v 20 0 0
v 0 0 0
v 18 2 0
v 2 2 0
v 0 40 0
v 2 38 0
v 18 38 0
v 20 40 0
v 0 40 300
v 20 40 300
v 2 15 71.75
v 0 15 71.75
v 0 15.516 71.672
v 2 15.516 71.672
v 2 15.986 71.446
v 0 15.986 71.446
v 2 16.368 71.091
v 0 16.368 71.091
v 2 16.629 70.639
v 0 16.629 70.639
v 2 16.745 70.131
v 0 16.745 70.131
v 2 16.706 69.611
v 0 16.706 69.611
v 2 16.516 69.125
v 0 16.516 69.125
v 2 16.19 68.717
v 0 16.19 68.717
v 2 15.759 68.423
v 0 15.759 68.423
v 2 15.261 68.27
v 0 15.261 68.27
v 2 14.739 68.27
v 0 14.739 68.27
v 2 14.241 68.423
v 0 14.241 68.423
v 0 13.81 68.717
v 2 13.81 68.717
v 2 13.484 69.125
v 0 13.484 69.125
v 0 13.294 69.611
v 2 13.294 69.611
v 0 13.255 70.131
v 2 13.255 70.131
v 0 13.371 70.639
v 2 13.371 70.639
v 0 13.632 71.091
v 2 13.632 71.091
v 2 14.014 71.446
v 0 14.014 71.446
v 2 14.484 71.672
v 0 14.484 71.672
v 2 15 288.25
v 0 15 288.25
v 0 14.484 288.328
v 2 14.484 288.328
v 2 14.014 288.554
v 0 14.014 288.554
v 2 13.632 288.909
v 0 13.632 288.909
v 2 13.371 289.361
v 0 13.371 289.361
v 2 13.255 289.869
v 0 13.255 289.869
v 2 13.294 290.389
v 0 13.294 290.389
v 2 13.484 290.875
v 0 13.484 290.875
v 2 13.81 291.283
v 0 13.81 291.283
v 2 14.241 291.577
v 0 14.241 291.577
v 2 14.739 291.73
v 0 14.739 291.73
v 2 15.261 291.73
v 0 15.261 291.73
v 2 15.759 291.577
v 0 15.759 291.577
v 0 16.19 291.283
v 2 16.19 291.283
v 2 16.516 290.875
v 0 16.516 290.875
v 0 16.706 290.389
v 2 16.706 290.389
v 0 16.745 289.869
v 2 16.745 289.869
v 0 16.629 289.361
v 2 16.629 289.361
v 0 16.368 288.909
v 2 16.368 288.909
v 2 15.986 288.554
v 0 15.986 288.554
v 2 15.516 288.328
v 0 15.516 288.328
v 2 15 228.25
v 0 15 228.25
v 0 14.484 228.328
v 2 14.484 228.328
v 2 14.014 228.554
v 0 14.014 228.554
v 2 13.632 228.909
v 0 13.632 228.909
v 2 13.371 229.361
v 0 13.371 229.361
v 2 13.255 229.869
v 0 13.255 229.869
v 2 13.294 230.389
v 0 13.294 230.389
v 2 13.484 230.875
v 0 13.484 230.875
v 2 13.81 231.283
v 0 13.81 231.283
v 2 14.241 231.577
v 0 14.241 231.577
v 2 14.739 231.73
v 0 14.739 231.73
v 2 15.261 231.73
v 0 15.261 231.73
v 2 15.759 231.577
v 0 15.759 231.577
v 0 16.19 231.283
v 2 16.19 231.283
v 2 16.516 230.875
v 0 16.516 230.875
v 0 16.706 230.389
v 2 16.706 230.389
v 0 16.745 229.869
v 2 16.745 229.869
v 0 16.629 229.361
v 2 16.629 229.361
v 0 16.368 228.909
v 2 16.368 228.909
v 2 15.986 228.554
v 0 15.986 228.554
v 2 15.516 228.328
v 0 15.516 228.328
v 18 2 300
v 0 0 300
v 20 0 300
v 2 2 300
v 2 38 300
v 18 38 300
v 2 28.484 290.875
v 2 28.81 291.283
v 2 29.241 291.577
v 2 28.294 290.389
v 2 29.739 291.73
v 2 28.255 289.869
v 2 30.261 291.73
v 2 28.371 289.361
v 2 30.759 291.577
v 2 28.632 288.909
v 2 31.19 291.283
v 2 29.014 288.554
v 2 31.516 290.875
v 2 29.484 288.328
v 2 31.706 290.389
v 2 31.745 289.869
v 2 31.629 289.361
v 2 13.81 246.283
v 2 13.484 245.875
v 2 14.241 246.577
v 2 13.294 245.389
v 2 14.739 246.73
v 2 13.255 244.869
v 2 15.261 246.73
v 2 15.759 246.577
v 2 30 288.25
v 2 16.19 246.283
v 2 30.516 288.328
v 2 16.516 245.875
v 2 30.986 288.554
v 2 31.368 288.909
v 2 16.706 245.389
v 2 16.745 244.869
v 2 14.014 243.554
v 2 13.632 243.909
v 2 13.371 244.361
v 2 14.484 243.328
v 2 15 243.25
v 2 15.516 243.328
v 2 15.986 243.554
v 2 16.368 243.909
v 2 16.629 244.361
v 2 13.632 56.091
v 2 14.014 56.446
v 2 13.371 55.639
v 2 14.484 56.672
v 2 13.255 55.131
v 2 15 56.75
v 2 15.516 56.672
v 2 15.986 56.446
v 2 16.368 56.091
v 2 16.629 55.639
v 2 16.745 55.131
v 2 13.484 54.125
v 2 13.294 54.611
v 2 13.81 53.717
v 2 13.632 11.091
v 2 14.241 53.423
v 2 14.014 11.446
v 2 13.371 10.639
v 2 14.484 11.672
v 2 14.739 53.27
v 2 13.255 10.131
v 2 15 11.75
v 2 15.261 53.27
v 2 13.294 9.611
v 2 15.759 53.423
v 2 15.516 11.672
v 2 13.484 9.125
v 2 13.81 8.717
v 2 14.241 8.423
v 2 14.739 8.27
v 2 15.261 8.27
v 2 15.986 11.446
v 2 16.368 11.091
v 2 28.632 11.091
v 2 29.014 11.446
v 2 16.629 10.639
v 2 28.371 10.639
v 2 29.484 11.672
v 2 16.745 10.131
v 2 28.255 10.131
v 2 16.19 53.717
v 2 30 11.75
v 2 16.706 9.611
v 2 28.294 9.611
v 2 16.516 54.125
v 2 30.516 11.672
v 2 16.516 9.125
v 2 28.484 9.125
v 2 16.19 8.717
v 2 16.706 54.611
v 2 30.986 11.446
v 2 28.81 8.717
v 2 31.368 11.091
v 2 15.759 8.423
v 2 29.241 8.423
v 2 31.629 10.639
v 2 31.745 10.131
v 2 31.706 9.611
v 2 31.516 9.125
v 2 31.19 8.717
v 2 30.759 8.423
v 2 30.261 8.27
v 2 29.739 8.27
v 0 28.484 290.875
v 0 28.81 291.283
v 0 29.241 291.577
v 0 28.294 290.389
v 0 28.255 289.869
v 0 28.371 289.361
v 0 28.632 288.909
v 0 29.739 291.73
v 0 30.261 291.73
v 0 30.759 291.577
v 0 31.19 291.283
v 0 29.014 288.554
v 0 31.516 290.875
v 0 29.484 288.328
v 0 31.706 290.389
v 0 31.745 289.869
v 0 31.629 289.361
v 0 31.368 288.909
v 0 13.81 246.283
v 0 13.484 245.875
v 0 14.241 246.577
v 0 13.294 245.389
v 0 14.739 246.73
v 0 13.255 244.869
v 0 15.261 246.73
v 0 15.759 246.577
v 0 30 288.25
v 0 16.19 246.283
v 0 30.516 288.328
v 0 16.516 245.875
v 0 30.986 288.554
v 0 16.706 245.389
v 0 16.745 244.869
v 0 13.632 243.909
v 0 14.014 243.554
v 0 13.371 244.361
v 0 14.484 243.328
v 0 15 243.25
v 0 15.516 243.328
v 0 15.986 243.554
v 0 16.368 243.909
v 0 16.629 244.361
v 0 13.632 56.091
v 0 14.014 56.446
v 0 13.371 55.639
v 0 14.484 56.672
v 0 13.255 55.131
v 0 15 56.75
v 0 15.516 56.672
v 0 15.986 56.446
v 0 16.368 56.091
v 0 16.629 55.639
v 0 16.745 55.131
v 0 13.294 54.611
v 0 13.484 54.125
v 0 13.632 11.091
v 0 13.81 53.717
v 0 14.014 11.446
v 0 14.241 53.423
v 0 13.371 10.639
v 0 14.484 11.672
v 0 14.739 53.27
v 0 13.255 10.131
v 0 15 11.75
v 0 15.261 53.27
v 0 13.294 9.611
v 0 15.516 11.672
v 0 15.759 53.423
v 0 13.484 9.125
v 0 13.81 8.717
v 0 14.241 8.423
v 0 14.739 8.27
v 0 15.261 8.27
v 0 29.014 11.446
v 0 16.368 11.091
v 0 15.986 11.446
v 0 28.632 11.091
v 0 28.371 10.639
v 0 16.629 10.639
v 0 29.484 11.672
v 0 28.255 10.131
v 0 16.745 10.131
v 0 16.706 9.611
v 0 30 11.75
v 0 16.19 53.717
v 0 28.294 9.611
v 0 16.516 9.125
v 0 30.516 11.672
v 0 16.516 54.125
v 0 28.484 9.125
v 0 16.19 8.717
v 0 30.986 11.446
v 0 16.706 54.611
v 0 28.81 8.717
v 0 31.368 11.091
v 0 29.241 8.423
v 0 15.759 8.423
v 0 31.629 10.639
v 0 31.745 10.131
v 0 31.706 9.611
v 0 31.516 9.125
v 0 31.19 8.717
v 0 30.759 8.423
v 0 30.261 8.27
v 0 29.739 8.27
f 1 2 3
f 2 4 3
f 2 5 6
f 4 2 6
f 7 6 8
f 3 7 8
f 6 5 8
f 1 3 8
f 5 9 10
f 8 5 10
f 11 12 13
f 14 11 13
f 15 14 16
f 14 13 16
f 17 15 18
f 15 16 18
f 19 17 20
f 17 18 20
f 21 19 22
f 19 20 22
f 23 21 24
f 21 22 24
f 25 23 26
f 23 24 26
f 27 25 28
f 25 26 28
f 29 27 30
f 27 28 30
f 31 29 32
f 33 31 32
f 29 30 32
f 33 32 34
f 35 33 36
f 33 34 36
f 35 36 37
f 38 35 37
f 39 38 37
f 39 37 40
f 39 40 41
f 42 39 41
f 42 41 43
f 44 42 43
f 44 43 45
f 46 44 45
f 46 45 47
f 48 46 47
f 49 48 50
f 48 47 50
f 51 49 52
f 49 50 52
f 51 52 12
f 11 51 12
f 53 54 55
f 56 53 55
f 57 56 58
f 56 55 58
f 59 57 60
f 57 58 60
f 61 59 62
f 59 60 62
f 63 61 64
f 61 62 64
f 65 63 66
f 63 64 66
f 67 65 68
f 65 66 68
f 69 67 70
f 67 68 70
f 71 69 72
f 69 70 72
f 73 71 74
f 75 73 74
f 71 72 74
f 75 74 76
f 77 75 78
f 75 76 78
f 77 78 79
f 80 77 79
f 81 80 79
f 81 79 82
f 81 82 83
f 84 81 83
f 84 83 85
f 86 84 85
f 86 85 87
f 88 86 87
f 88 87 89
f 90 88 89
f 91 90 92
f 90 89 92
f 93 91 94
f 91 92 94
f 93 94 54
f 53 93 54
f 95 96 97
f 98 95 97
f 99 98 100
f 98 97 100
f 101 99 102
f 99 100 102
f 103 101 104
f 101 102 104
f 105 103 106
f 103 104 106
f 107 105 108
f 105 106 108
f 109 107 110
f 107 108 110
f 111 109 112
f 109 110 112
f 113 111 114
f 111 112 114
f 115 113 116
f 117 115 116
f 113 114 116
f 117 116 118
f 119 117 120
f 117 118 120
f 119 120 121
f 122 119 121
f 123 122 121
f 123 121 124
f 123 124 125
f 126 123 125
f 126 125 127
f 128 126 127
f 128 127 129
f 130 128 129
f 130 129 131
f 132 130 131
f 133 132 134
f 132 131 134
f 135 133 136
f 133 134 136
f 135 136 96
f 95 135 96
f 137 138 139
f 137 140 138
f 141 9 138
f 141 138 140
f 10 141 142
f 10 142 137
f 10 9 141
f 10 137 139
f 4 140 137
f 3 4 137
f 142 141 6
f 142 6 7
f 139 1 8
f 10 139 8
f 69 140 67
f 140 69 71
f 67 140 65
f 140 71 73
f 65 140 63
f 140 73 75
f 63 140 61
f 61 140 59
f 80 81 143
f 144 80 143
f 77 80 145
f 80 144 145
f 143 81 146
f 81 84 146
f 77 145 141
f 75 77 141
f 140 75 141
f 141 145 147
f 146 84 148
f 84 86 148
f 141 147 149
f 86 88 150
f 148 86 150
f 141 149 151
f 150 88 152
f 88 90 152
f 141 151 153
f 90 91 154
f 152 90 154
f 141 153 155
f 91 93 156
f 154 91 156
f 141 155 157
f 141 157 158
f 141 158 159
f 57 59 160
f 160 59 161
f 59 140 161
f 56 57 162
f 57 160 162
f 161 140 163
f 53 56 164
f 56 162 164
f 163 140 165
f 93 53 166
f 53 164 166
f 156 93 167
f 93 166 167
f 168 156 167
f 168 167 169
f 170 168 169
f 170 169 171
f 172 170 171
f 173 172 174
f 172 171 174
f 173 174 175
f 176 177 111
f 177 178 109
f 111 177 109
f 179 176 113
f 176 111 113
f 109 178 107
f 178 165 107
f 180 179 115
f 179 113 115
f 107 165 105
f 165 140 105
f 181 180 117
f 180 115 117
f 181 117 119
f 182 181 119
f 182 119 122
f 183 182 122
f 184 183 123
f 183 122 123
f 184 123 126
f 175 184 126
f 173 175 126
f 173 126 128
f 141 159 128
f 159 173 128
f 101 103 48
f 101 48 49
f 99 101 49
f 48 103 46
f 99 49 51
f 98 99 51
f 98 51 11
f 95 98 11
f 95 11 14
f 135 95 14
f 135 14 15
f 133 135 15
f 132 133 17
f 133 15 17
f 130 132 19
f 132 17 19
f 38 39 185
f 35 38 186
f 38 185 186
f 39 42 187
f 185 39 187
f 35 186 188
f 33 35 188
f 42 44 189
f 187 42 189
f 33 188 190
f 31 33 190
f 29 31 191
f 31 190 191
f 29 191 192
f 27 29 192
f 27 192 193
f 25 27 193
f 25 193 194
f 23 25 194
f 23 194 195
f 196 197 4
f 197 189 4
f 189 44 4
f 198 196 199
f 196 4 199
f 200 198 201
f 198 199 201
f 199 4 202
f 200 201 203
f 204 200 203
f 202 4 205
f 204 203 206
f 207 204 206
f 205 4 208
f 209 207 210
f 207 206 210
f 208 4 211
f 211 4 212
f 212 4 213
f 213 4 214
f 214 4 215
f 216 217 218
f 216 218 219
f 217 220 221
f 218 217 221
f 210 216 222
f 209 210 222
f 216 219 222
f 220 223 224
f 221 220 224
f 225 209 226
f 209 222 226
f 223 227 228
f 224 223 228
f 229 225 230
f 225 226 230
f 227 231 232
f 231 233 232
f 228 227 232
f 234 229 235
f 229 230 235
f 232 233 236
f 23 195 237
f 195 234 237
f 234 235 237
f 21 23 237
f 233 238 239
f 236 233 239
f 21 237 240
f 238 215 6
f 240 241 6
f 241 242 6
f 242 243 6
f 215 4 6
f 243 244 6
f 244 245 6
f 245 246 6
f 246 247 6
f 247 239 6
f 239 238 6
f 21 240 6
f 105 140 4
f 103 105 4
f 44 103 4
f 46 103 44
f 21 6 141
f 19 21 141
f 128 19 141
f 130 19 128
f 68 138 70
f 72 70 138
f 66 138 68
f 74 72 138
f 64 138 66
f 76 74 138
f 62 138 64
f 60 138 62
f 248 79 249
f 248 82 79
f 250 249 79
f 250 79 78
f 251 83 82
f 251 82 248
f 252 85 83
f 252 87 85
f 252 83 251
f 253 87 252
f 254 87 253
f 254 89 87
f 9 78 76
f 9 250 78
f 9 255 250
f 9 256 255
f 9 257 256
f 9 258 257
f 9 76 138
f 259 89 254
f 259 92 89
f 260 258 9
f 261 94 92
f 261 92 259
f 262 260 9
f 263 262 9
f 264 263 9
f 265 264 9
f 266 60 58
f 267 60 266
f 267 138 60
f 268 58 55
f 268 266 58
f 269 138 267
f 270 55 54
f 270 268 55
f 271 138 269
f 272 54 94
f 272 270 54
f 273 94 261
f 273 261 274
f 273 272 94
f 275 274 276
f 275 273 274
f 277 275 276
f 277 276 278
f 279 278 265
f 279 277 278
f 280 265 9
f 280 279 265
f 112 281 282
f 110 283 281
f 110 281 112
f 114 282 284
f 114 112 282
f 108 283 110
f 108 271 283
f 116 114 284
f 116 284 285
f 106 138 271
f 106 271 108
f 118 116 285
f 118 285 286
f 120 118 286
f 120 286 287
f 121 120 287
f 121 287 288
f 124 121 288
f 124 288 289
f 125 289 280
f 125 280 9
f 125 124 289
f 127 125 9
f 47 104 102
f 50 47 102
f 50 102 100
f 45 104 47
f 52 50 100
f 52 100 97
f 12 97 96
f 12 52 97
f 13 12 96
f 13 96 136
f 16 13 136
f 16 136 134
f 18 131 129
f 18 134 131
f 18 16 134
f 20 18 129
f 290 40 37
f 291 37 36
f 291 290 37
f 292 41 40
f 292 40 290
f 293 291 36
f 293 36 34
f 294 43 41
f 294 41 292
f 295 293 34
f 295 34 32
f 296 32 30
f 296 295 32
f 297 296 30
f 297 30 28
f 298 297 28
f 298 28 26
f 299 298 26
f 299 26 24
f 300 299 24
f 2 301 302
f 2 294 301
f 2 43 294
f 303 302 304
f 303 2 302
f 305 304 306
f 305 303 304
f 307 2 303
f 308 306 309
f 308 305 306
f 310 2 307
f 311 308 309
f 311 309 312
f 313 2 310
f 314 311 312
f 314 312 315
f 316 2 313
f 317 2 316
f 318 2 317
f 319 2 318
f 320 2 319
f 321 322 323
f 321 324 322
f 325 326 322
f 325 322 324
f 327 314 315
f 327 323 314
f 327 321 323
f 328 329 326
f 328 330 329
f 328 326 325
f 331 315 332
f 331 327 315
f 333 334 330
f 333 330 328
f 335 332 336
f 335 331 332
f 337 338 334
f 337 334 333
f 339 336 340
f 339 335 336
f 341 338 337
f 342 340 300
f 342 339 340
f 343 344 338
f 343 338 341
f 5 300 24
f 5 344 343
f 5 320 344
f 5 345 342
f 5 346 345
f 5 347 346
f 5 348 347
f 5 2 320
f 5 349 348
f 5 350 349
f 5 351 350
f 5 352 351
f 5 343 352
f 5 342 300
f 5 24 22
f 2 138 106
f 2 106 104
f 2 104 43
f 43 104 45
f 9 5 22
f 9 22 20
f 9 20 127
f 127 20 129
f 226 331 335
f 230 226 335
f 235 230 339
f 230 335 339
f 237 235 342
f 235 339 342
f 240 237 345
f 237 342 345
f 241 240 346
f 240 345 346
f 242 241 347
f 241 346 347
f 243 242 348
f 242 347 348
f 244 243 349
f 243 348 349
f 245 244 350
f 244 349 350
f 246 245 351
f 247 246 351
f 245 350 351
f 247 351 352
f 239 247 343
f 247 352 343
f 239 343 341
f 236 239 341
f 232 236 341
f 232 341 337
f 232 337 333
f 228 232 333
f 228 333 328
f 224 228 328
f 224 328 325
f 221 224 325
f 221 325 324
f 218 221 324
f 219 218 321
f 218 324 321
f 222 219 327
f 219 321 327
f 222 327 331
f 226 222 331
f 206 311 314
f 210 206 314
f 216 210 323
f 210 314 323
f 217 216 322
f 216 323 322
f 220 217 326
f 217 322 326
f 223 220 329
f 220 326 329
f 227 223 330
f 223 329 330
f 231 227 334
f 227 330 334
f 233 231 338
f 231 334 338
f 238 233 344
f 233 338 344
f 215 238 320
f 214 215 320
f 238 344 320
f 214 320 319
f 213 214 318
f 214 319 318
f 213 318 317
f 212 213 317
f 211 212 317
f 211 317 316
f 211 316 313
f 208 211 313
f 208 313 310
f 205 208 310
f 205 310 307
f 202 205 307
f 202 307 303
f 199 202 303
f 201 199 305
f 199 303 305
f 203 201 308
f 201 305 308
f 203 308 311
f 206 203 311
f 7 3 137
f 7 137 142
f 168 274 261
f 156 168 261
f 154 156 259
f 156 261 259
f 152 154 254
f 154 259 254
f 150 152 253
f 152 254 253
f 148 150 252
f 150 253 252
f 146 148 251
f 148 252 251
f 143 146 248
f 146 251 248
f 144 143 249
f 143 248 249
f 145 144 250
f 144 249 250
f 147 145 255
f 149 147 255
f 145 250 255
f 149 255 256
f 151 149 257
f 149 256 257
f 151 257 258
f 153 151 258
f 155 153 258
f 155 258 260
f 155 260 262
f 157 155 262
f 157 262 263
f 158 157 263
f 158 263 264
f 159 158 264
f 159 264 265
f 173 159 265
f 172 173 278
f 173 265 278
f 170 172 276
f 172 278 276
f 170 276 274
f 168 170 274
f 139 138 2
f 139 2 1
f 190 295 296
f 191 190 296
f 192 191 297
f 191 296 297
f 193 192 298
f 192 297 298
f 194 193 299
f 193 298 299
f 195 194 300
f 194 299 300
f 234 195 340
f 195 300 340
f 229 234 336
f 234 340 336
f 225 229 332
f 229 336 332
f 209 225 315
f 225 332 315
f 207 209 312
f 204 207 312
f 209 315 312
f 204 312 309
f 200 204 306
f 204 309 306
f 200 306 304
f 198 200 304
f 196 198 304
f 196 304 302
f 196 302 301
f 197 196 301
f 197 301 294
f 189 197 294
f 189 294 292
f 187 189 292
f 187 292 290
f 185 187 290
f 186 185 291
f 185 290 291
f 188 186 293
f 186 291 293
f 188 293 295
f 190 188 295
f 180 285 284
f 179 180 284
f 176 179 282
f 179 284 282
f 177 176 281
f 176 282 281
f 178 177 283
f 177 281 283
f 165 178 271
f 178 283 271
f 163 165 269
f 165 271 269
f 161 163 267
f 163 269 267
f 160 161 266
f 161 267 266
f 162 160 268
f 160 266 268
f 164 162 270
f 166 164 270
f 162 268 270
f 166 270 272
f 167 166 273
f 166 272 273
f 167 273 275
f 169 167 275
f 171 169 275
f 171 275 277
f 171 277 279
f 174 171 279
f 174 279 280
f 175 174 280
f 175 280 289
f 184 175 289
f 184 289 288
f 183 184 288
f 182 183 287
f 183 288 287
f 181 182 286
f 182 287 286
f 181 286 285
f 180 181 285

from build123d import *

# Parameters (mm, degrees)
ESBO_O1_W                = 20
ESBO_O1_H                = 40
ESBO_O1_W_2              = 16
ESBO_O1_H_2              = 36
RESSALTO_EXTRUS_O1_DEPTH = 300
ESBO_O2_R                = 1.75
CORTE_EXTRUS_O1_DEPTH    = 2


with BuildPart() as part:
    # Esboço1 → Ressalto-extrusão1 (new body)
    with BuildSketch(Plane.XY):
        with Locations((10, 20)):
            Rectangle(ESBO_O1_W, ESBO_O1_H)
        with Locations((10, 20)):
            Rectangle(ESBO_O1_W_2, ESBO_O1_H_2, mode=Mode.SUBTRACT)
    extrude(amount=RESSALTO_EXTRUS_O1_DEPTH)

    # Esboço2 → Corte-extrusão1 (cut)
    with BuildSketch(Plane.ZY):
        with Locations((10, 30)):
            Circle(ESBO_O2_R)
        with Locations((10, 15)):
            Circle(ESBO_O2_R)
        with Locations((70, 15)):
            Circle(ESBO_O2_R)
        with Locations((55, 15)):
            Circle(ESBO_O2_R)
        with Locations(Location((230, 15, 0), (0, 0, 180))):
            Circle(ESBO_O2_R)
        with Locations(Location((245, 15, 0), (0, 0, 180))):
            Circle(ESBO_O2_R)
        with Locations(Location((290, 15, 0), (0, 0, 180))):
            Circle(ESBO_O2_R)
        with Locations(Location((290, 30, 0), (0, 0, 180))):
            Circle(ESBO_O2_R)
    extrude(amount=-CORTE_EXTRUS_O1_DEPTH, mode=Mode.SUBTRACT)


solid = part.part
